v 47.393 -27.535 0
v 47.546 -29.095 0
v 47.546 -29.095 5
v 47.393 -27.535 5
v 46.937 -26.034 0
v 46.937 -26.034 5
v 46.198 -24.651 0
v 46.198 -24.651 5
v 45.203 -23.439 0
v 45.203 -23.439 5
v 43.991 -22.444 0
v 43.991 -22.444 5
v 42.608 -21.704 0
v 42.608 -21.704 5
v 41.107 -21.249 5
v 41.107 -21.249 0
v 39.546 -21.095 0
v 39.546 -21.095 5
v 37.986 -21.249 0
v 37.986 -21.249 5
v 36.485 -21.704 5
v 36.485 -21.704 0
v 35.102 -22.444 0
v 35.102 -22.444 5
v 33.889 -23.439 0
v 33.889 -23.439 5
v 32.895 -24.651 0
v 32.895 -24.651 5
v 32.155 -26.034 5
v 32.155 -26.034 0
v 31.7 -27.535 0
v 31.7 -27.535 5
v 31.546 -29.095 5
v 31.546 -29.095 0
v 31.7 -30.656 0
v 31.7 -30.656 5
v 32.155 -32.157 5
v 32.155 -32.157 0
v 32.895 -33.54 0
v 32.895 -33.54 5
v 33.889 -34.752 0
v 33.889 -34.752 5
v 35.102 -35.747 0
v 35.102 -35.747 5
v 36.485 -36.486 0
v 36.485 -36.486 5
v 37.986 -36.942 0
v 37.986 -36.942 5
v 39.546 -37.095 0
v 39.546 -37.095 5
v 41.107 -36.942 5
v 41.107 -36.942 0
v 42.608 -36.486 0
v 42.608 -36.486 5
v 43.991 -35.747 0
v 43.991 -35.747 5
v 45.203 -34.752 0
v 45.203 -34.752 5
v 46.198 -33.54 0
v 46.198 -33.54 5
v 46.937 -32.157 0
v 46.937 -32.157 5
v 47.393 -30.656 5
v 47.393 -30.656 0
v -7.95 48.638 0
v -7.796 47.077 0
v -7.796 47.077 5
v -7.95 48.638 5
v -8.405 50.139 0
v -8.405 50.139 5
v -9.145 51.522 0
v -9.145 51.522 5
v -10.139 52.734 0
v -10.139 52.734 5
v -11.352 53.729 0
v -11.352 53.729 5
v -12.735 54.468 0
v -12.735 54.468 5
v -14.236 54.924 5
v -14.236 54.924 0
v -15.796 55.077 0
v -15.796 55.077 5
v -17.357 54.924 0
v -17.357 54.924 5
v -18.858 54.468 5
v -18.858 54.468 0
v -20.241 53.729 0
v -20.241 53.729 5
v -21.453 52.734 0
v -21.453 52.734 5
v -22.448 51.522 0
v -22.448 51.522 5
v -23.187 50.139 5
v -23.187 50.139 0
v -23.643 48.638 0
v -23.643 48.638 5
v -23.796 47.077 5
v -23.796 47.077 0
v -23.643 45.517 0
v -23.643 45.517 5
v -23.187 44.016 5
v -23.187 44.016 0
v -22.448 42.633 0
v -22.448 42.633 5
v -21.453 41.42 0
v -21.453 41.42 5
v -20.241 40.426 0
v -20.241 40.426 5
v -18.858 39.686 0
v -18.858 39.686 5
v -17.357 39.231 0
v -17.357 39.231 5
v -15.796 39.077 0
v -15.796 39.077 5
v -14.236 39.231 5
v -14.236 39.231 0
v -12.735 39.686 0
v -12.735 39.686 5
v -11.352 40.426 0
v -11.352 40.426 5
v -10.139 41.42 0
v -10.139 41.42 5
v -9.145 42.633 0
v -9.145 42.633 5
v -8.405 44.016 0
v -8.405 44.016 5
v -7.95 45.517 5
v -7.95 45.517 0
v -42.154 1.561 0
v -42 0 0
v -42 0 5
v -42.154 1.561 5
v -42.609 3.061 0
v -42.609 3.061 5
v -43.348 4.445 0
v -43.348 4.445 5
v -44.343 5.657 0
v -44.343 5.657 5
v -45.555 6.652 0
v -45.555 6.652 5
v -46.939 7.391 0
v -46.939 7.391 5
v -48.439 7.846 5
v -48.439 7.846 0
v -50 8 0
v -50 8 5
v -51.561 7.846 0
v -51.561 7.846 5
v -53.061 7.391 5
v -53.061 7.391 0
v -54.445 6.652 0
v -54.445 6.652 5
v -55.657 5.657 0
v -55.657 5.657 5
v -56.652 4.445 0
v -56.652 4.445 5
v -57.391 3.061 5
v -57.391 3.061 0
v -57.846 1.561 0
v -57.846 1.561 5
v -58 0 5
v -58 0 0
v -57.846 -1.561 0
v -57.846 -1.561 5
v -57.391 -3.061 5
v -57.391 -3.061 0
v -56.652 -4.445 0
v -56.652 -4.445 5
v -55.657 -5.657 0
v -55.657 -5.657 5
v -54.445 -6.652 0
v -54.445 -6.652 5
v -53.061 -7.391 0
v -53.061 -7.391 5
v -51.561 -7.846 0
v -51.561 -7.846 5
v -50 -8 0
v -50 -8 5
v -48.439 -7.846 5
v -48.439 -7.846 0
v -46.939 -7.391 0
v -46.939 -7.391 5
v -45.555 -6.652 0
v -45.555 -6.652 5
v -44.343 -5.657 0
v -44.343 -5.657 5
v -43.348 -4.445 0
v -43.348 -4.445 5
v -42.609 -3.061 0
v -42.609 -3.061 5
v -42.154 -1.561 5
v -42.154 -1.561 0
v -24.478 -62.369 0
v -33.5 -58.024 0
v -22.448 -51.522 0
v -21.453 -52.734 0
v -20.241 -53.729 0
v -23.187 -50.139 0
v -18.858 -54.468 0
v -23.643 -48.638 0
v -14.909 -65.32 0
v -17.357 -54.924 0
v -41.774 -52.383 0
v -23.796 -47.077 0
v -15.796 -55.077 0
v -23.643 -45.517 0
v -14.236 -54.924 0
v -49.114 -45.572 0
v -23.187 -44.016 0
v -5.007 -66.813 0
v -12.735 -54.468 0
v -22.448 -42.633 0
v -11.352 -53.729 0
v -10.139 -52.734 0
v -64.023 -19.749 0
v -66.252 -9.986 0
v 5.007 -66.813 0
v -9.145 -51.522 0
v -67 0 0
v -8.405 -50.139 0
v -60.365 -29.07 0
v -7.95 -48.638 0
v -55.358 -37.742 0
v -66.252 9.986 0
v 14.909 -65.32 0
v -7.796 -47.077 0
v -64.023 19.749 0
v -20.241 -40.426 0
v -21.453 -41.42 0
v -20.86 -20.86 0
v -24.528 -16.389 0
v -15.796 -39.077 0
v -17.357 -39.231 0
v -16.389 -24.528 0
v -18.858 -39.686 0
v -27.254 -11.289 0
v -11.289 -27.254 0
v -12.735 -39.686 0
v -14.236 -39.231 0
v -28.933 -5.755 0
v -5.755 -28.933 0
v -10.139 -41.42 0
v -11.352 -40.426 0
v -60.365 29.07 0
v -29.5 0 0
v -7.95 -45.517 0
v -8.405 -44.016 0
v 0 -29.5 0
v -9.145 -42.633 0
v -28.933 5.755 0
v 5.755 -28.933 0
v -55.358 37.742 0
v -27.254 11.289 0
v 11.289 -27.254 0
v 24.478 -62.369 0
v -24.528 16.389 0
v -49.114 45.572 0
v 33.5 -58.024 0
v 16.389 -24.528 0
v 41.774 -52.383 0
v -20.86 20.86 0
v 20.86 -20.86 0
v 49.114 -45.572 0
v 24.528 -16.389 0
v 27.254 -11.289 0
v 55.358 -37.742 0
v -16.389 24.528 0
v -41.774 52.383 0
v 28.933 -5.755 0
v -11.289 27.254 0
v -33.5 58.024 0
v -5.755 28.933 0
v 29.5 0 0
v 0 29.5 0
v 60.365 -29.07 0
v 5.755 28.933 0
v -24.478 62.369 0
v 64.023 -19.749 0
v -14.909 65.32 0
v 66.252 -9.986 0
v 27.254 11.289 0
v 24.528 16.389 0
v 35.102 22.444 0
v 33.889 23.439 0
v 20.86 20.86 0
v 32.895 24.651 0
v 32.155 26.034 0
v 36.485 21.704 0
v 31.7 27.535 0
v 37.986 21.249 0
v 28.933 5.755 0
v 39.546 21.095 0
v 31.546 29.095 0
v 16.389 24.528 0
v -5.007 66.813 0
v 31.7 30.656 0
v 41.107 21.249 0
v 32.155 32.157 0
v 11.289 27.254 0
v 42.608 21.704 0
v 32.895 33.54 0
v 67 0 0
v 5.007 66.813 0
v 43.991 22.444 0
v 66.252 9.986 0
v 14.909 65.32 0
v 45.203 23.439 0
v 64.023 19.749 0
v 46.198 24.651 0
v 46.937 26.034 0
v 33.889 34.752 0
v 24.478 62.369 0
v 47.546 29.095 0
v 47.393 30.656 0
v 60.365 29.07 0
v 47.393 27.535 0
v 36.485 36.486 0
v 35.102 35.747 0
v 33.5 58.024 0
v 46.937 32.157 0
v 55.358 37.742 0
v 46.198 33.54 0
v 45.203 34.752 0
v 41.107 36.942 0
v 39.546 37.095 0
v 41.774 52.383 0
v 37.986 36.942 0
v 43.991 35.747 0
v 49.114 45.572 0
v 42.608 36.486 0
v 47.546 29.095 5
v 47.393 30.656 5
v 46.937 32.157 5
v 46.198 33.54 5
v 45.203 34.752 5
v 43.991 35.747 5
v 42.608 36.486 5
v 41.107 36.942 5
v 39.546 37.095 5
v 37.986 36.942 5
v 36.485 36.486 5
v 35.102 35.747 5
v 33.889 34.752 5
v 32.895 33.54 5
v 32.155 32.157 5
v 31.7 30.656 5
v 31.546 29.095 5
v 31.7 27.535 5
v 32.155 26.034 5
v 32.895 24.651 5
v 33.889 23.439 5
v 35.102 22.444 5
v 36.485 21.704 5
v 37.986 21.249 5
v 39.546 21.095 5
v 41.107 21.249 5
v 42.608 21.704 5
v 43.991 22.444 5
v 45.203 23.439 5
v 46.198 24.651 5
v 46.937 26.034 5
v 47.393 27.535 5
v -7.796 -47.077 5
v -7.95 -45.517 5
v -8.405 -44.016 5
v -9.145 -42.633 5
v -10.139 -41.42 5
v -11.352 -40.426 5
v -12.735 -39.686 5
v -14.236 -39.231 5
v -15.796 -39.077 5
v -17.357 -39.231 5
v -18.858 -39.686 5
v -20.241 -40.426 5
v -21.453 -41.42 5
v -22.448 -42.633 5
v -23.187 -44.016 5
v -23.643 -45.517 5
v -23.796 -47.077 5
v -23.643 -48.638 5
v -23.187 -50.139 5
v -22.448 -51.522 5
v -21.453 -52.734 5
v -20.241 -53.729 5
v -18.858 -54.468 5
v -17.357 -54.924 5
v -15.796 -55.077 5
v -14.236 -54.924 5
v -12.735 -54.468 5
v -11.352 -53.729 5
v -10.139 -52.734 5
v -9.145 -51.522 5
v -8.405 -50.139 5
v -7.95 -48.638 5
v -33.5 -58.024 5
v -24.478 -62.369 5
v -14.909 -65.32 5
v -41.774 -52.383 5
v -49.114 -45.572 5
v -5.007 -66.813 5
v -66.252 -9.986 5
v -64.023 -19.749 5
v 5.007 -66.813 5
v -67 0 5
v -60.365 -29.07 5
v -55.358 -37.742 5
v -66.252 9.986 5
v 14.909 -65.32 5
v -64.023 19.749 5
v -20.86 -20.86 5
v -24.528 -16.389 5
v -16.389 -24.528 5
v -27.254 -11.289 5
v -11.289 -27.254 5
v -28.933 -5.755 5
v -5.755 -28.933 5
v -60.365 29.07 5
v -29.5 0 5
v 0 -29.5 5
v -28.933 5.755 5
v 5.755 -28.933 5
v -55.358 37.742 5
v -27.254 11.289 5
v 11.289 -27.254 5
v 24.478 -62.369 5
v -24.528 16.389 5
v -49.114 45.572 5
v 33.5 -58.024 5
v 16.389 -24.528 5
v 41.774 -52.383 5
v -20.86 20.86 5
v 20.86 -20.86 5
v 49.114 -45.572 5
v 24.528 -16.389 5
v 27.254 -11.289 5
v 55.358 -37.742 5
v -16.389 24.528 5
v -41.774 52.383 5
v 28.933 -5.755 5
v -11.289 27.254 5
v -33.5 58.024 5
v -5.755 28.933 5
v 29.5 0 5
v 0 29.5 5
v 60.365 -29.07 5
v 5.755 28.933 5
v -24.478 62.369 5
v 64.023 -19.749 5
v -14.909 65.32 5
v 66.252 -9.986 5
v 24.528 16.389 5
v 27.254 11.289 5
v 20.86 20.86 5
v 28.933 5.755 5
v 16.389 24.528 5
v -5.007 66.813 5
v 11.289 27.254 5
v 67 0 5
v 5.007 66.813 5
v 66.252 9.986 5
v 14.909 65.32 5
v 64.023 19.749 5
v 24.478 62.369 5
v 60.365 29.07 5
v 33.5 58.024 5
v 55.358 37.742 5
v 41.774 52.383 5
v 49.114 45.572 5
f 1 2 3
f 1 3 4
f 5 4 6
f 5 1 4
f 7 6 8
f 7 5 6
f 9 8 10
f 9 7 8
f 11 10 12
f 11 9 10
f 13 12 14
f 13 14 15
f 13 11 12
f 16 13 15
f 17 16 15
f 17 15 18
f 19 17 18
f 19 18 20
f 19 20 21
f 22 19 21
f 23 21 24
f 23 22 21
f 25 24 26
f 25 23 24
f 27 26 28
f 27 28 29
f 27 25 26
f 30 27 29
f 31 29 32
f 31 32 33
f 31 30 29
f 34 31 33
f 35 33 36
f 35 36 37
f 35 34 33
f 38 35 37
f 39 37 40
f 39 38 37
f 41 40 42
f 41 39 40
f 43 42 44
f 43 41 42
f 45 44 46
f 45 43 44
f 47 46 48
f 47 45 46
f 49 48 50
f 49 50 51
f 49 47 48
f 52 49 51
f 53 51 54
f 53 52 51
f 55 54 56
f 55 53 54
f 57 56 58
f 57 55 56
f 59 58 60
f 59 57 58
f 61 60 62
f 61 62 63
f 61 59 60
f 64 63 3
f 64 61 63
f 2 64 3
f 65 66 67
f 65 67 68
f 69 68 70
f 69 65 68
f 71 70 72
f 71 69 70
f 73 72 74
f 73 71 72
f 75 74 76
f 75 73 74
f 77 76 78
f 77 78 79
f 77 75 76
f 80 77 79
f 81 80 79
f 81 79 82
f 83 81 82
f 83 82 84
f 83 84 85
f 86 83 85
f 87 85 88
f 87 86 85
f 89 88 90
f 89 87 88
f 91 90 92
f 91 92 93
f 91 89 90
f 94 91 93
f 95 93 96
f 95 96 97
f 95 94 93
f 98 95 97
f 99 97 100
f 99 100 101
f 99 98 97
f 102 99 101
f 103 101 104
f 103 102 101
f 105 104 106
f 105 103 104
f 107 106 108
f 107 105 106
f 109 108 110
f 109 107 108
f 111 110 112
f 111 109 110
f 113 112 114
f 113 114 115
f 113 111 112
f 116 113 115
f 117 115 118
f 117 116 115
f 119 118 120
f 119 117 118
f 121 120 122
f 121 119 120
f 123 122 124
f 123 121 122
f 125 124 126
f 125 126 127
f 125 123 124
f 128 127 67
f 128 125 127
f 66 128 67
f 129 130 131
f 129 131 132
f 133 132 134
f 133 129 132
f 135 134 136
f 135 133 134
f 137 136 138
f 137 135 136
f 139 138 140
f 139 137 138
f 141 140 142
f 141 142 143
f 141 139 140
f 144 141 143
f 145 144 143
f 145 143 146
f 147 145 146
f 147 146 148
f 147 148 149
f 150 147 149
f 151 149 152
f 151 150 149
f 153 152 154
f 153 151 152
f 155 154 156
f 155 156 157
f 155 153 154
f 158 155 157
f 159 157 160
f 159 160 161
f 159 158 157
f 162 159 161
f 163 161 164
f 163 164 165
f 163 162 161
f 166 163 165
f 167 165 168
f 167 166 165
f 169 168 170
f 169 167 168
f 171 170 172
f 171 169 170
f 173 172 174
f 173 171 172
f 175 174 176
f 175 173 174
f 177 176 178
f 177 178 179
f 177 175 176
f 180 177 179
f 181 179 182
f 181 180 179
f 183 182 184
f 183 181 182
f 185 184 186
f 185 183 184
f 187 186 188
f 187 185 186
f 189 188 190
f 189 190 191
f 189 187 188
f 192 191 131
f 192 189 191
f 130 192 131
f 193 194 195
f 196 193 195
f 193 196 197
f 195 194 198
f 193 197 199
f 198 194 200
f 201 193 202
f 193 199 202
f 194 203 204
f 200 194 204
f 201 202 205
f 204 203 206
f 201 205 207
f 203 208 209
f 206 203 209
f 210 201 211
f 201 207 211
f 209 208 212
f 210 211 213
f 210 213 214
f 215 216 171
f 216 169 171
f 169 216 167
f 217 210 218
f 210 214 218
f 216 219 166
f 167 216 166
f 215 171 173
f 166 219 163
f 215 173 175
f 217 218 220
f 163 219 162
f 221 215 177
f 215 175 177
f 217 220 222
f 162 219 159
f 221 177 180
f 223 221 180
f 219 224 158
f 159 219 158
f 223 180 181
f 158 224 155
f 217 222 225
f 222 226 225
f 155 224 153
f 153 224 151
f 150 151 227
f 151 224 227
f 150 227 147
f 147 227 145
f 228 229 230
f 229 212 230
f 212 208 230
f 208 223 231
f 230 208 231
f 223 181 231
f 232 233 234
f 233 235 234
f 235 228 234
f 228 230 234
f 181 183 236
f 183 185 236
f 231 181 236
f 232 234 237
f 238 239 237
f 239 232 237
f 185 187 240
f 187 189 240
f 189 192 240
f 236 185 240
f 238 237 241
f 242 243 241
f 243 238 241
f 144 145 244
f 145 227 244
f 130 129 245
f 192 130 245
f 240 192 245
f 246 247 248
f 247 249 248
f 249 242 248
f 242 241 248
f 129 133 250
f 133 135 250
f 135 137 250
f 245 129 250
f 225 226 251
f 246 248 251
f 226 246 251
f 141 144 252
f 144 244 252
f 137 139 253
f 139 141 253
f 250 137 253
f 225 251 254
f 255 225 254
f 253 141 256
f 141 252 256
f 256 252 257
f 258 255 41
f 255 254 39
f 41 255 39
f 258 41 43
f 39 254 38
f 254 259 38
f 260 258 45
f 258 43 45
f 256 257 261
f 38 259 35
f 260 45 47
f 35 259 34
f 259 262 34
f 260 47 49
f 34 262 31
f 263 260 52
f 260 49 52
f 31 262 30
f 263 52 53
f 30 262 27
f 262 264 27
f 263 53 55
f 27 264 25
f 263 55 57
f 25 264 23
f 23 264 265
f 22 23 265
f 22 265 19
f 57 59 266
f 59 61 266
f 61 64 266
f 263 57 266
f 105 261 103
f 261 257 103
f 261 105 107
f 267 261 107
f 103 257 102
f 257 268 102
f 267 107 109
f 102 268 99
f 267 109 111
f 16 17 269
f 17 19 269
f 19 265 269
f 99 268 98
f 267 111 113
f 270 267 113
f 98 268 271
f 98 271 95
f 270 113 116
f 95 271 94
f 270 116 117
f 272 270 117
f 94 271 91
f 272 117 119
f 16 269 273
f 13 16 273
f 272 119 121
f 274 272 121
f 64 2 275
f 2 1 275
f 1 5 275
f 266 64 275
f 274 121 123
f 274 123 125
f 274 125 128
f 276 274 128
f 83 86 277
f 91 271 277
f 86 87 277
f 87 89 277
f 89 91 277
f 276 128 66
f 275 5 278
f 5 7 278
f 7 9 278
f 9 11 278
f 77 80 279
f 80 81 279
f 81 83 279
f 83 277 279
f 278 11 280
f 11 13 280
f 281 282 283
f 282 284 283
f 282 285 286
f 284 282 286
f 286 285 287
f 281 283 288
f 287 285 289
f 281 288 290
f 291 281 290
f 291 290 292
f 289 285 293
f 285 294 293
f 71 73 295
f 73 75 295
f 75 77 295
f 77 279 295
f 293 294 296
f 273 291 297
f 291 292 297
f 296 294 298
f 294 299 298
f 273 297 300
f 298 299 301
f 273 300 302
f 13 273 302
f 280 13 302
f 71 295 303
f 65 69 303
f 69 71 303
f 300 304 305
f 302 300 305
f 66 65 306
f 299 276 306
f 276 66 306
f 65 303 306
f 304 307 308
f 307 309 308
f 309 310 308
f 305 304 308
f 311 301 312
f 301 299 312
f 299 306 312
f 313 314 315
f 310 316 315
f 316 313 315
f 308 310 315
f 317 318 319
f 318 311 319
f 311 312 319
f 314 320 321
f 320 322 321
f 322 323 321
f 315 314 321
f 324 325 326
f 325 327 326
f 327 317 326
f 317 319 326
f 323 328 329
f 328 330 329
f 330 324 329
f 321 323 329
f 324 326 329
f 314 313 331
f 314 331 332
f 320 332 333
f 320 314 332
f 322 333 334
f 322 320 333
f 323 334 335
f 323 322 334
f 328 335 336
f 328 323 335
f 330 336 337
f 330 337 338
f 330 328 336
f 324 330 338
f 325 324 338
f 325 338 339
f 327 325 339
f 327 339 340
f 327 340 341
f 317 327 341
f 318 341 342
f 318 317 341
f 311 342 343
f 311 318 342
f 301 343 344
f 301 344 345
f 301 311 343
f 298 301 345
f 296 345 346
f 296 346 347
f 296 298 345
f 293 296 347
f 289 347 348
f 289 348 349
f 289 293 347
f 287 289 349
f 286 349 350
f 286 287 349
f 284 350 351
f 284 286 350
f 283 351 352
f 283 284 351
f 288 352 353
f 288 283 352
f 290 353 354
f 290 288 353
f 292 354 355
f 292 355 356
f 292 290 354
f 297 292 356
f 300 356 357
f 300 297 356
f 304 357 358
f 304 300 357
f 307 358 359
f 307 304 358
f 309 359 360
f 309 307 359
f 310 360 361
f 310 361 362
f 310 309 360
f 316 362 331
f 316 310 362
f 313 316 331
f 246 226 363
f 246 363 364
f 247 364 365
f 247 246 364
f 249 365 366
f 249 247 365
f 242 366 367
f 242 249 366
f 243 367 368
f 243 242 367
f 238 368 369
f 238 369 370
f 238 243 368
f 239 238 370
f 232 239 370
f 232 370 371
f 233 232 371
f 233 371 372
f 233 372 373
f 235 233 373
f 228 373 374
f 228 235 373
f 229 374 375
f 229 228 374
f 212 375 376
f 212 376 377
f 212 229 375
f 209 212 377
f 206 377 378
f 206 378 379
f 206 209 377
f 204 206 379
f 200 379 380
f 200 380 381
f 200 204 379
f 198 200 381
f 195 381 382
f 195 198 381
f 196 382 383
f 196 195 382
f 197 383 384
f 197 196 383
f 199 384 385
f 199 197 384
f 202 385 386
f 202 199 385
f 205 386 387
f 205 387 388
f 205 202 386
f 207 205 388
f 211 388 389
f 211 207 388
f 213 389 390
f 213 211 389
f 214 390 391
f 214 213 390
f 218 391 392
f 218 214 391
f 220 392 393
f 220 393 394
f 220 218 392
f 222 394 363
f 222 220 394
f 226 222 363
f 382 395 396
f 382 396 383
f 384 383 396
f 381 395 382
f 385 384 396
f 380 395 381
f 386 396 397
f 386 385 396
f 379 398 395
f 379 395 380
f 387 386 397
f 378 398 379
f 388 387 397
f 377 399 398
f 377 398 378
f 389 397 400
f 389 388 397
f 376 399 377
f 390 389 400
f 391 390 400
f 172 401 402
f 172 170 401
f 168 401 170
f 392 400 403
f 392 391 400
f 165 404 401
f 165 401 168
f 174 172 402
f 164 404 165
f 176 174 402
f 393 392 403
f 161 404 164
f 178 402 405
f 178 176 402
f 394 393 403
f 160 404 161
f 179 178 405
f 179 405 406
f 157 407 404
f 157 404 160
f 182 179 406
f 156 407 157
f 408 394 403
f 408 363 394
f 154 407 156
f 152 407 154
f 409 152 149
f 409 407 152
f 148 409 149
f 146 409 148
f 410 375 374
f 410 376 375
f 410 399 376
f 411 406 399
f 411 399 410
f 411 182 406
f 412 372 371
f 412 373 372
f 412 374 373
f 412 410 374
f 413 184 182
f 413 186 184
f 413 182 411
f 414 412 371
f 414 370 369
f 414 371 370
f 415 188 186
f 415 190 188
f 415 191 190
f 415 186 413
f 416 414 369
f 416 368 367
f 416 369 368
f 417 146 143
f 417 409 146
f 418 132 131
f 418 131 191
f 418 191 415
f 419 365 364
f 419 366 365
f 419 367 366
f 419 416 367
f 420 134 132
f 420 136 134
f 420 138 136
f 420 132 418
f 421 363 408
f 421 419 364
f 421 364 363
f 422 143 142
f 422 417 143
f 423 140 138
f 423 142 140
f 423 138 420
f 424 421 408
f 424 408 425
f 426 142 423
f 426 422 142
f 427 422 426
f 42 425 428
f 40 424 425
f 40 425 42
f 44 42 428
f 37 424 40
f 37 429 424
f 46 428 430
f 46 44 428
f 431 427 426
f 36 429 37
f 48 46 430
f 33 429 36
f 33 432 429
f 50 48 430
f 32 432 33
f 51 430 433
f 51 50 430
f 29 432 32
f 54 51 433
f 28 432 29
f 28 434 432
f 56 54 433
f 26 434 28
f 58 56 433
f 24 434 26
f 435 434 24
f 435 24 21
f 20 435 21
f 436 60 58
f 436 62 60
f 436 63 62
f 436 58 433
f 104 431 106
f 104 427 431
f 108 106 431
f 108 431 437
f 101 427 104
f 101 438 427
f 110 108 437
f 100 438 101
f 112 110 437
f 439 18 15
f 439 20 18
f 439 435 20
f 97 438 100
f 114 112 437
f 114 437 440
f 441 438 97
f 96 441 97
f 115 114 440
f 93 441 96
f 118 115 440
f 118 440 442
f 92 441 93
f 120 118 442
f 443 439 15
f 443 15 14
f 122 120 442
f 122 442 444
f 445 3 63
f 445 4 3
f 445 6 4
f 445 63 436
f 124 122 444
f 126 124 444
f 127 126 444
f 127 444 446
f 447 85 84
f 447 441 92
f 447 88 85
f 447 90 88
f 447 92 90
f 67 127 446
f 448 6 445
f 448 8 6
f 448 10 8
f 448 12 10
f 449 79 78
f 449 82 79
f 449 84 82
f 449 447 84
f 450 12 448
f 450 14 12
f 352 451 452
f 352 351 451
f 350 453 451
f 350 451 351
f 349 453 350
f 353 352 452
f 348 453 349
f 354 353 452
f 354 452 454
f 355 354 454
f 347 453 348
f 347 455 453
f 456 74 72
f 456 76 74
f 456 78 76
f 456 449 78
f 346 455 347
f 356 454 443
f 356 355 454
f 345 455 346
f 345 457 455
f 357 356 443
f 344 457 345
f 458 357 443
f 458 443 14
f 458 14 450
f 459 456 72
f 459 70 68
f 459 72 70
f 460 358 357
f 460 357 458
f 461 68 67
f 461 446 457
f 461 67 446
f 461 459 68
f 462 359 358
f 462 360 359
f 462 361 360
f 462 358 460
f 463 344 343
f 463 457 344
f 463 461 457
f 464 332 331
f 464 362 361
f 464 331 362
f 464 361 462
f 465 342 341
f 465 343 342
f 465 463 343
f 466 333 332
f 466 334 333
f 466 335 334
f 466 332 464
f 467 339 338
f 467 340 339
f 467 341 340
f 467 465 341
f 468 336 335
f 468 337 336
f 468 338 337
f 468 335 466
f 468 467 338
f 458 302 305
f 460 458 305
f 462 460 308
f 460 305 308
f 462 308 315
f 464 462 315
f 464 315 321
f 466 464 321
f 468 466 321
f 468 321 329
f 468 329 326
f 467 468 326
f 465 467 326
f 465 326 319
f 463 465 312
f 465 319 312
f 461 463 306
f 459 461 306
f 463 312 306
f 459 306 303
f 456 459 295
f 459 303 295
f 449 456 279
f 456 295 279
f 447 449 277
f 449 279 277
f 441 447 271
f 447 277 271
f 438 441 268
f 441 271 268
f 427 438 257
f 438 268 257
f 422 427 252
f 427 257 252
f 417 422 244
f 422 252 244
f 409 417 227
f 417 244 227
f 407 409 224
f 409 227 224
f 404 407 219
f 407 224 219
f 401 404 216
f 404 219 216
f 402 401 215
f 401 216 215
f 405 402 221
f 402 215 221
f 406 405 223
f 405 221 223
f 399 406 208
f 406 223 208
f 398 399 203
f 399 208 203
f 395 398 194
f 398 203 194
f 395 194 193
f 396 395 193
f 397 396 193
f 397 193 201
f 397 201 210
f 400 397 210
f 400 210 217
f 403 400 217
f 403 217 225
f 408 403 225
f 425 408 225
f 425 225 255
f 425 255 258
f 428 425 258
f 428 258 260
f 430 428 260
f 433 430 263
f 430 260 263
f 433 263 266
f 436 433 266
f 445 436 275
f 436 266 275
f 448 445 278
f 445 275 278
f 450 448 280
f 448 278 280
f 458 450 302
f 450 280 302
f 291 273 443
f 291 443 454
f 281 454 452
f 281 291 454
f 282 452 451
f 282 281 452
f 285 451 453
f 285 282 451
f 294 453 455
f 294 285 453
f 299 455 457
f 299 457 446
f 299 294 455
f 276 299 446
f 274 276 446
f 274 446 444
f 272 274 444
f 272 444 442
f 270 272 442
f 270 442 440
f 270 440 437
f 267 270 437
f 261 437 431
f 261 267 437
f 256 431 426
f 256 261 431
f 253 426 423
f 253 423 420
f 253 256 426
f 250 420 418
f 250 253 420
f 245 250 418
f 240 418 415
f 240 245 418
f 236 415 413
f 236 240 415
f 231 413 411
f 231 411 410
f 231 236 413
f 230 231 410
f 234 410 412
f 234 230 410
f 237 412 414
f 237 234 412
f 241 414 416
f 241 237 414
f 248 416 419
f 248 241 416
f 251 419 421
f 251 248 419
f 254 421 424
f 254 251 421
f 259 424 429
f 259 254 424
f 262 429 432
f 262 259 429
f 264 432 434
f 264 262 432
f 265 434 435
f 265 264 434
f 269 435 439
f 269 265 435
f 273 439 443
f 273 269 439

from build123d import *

# Parameters (mm, degrees)
F0_R     = 67
F0_R_2   = 8
F0_R_3   = 29.5
F1_DEPTH = 5


with BuildPart() as f1:
    # F0 (on Top) → F1 (new body)
    with BuildSketch(Plane.XY):
        Circle(F0_R)
        with Locations((-15.796341, -47.077298)):
            Circle(F0_R_2, mode=Mode.SUBTRACT)
        with Locations((39.546341, -29.09537)):
            Circle(F0_R_2, mode=Mode.SUBTRACT)
        with Locations((-50, 0)):
            Circle(F0_R_2, mode=Mode.SUBTRACT)
        with Locations((-15.796341, 47.077298)):
            Circle(F0_R_2, mode=Mode.SUBTRACT)
        Circle(F0_R_3, mode=Mode.SUBTRACT)
        with Locations((39.546341, 29.09537)):
            Circle(F0_R_2, mode=Mode.SUBTRACT)
    extrude(amount=F1_DEPTH)


solid = f1.part
